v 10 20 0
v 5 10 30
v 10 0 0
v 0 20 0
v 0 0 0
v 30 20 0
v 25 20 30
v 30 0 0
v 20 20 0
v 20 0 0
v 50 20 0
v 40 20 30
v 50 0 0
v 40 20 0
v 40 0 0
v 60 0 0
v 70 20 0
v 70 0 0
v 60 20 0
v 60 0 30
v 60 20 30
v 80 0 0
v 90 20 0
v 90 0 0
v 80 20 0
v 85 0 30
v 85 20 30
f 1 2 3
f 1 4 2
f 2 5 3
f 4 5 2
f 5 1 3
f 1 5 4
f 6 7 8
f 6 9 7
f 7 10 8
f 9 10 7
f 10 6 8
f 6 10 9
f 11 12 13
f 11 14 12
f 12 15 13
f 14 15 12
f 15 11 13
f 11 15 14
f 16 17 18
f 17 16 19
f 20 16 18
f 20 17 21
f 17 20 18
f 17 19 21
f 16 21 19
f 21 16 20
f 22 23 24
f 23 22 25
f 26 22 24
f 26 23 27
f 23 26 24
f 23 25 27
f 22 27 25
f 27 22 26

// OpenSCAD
// file: ../libtriangles.scad
//todo, make library work with negative lengths by adding triangles to the inside of every surface. basicaly copy and paste the current triangles set and reverse the first and last digit of every triangle. In 4 character traingles switcht the middle ones around as well.

module rightpyramid(rightpyramidx, rightpyramidy, rightpyramidz) {
	polyhedron ( points = [[0,0,0], 
			[rightpyramidx, 0, 0], 
			[0, rightpyramidy, 0], 
			[rightpyramidx, rightpyramidy, 0],
			[rightpyramidx/2, rightpyramidy, rightpyramidz]], 

	triangles = [[0,1,2],[2,1,3],[4,1,0],[3,1,4],[2,3,4],[0,2,4]]);

}

module cornerpyramid(cornerpyramidx, cornerpyramidy, cornerpyramidz) {
	polyhedron ( points = [[0,0,0], 
			[cornerpyramidx, 0, 0], 
			[0, cornerpyramidy, 0], 
			[cornerpyramidx, cornerpyramidy, 0],
			[0, cornerpyramidy, cornerpyramidz]], 

	triangles = [[0,1,2],[2,1,3],[4,1,0],[3,1,4],[2,3,4],[0,2,4]]);

}

module eqlpyramid(eqlpyramidx, eqlpyramidy, eqlpyramidz) {
	polyhedron ( points = [[0,0,0], 
			[eqlpyramidx, 0, 0], 
			[0, eqlpyramidy, 0], 
			[eqlpyramidx, eqlpyramidy, 0],
			[eqlpyramidx/2, eqlpyramidy/2, eqlpyramidz]], 

	triangles = [[0,1,2],[2,1,3],[4,1,0],[3,1,4],[2,3,4],[0,2,4]]);

}


module rightprism(rightprismx,rightprismy,rightprismz){
	polyhedron ( points = [[0,0,0],
			[rightprismx,0,0],
			[rightprismx,rightprismy,0],
			[0,rightprismy,0],
			[0,rightprismy,rightprismz],
			[0,0,rightprismz]], 
	triangles = [[0,1,2,3],[5,1,0],[5,4,2,1],[4,3,2],[0,3,4,5]]);
}



module eqlprism(rightprismx,rightprismy,rightprismz){
	polyhedron ( points = [[0,0,0],
			[rightprismx,0,0],
			[rightprismx,rightprismy,0],
			[0,rightprismy,0],
			[rightprismx/2,rightprismy,rightprismz],
			[rightprismx/2,0,rightprismz]], 
	triangles = [[0,1,2,3],[5,1,0],[5,4,2,1],[4,3,2],[0,3,4,5]]);
}
// main file
use <../libtriangles.scad>;

//all of these follow the (X,Y,Z) syntax

translate(v = [0, 0, 0])eqlpyramid(10,20,30);
translate(v = [20, 0, 0]) rightpyramid(10,20,30);
translate(v = [40, 0, 0]) cornerpyramid(10,20,30);
translate(v = [60, 0, 0]) rightprism(10,20,30);
translate(v = [80, 0, 0]) eqlprism(10,20,30);
